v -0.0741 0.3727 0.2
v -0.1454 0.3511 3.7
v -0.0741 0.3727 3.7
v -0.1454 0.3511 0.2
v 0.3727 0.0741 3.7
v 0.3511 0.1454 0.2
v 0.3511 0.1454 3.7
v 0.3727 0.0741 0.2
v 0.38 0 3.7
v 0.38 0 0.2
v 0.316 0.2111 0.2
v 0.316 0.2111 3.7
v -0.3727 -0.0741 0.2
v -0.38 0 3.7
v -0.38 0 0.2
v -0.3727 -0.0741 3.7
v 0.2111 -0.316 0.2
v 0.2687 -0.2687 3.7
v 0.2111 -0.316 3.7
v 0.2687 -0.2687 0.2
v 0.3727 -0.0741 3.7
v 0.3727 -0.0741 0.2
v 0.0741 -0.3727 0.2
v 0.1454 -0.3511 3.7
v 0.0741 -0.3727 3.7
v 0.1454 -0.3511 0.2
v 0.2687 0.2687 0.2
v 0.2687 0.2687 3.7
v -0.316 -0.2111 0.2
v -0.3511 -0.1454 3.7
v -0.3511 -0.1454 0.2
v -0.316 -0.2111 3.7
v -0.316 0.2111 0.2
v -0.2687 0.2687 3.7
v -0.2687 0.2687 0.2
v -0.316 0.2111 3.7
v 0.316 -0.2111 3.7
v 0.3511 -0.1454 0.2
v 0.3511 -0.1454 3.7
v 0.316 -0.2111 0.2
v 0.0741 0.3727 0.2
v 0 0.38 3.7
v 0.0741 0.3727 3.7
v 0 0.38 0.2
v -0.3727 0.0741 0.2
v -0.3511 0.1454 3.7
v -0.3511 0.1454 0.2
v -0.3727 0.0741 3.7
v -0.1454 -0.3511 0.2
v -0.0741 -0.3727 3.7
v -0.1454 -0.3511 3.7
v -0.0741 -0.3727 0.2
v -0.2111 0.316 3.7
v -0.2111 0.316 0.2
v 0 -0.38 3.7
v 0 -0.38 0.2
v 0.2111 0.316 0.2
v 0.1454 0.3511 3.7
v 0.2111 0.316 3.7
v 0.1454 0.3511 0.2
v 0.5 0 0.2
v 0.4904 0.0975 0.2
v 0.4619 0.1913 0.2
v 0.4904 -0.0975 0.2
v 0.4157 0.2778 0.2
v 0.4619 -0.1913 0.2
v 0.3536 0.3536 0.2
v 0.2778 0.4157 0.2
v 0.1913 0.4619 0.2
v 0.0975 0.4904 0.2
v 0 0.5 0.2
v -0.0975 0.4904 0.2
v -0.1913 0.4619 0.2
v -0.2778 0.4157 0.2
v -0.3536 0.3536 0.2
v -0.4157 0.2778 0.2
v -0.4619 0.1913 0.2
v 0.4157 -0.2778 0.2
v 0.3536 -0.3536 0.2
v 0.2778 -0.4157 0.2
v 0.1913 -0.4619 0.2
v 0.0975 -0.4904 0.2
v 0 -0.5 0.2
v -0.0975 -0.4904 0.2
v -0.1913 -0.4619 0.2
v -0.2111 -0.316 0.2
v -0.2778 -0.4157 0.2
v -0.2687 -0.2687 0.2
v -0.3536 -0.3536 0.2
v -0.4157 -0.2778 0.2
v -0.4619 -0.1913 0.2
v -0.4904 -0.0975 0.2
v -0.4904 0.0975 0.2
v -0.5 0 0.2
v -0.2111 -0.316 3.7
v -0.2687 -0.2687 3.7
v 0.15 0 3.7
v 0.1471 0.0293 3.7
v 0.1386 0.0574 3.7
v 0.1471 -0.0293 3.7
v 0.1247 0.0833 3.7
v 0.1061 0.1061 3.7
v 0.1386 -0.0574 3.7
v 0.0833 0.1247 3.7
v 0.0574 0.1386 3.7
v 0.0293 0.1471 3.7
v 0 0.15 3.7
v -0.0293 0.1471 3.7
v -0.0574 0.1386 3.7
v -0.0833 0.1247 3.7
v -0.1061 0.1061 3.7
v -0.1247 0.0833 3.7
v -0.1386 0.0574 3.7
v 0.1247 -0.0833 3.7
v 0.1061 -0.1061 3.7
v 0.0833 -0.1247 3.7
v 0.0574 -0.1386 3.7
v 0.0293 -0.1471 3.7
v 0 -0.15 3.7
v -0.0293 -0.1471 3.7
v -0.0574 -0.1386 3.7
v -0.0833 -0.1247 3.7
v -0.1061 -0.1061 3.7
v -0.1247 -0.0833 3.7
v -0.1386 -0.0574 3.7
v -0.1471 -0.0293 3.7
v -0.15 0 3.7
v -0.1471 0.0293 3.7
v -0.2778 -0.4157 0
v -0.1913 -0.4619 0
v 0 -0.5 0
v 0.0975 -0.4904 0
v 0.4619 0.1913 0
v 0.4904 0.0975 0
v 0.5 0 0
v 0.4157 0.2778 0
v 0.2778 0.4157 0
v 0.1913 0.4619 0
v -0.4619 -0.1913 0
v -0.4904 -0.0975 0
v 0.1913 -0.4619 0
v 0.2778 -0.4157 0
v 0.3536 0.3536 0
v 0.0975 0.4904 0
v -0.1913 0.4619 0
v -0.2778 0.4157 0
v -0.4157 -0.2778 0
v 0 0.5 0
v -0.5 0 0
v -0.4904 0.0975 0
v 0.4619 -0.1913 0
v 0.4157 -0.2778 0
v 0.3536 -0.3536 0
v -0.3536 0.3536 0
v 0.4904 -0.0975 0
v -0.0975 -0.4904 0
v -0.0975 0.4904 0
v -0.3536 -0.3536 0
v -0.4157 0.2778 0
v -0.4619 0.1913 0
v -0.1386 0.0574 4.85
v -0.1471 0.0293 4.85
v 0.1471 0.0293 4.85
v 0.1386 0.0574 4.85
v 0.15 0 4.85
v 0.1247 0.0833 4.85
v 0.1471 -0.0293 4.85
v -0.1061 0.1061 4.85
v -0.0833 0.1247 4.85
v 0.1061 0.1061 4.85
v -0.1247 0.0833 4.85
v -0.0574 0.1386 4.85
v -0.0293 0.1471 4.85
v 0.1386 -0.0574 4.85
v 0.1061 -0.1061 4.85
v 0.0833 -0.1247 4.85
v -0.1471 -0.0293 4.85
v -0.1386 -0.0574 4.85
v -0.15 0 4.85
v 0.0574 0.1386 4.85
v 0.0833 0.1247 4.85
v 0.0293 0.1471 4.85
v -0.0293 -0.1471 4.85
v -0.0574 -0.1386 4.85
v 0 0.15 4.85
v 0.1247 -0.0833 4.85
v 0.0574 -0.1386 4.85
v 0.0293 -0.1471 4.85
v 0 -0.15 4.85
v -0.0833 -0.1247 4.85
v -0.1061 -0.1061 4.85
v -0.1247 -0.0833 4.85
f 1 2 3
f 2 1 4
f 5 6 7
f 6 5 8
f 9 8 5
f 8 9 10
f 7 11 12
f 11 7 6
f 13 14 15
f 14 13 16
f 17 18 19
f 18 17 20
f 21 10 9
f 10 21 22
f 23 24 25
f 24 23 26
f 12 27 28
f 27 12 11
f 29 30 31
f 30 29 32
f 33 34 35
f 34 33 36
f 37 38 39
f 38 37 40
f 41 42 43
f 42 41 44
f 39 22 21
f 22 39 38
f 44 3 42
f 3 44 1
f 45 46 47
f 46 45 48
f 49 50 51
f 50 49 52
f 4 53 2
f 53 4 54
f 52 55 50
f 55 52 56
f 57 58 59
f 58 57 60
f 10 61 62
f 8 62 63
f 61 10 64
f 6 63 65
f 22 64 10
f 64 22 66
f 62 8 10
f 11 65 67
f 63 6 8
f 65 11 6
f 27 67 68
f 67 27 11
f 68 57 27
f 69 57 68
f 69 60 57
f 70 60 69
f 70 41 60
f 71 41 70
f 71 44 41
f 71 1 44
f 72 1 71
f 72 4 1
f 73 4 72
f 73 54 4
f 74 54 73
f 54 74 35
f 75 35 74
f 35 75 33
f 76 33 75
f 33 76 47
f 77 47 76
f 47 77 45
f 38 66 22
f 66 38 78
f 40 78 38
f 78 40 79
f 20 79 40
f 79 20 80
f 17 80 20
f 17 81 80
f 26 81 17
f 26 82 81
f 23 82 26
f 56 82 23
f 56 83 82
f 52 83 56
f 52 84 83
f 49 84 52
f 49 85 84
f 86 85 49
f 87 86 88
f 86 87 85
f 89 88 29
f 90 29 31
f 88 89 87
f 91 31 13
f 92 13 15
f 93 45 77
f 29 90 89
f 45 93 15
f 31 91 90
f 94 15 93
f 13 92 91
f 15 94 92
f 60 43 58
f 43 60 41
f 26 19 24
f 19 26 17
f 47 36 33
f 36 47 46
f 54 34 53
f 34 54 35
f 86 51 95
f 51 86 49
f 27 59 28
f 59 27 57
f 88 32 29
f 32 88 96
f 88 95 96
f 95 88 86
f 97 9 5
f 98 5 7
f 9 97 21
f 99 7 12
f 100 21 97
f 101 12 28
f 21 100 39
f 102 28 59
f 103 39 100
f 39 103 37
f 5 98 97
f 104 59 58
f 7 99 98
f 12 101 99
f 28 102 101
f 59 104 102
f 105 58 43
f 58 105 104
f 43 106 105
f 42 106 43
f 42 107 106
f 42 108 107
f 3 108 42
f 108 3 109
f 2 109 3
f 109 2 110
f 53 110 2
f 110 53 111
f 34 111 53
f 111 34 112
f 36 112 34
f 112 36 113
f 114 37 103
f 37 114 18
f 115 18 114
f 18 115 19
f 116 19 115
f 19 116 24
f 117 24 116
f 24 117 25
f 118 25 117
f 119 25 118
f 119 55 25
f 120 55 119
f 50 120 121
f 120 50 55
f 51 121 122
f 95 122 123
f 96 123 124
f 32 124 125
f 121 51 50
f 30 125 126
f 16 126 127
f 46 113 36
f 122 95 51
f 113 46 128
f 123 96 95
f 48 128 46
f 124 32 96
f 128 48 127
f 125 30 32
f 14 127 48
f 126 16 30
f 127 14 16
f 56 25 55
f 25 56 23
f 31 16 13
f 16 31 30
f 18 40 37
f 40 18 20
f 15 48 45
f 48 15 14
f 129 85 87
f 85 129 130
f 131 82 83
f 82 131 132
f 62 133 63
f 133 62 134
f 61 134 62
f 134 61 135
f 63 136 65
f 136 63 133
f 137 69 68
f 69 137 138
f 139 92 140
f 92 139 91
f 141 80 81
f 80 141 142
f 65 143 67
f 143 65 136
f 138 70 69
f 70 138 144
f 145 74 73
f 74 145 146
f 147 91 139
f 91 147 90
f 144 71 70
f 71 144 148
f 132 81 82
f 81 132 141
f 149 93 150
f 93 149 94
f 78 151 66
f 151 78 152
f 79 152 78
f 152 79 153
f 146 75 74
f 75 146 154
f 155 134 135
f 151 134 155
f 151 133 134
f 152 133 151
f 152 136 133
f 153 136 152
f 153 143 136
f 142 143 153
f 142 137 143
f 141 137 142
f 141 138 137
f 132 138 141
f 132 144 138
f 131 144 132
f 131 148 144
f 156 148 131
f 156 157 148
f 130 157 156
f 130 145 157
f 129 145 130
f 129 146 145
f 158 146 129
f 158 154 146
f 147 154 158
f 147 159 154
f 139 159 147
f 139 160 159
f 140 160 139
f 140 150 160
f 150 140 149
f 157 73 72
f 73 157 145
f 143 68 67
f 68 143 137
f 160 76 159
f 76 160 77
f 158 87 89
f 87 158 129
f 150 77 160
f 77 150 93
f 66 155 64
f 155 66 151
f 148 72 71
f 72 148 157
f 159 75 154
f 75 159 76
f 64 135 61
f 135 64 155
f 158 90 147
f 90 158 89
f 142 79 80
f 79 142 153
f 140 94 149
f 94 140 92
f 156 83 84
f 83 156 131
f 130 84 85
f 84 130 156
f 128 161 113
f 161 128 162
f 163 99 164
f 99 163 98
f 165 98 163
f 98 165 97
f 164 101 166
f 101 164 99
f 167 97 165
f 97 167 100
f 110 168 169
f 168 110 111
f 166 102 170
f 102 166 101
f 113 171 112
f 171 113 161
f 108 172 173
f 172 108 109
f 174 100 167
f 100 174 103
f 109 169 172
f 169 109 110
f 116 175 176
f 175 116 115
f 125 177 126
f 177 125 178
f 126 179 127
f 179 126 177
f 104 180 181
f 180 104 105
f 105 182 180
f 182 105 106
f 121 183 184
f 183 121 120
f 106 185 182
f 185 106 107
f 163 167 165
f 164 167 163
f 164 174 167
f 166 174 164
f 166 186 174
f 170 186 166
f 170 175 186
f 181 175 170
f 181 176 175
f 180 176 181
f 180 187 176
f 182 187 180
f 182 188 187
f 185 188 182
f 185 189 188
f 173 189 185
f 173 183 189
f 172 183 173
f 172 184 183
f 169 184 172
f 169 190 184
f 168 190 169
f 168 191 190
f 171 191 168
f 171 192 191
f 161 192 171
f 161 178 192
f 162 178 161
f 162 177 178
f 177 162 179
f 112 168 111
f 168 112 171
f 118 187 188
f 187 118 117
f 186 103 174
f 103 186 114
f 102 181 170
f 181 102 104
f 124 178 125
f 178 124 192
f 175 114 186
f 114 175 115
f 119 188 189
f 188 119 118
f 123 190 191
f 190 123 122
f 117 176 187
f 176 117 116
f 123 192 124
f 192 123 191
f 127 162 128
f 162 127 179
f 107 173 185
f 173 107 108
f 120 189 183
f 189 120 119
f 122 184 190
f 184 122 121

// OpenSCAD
// Parameters
body_diameter_mm = 0.76; //[0.38:1.52:0.01]
overall_height_mm = 4.7; //[2.35:9.4:0.05]
body_height_mm = 3.5; //[1.75:7:0.05]
lever_height_mm = 1.2; //[0.6:2.4:0.05]
lever_diameter_mm = 0.3; //[0.15:0.6:0.01]
base_flange_diameter_mm = 1; //[0.5:2:0.05]
base_flange_thickness_mm = 0.2; //[0.1:0.4:0.01]
overlap_mm = 0.05; //[0.02:0.2:0.01]

// Toggle switch - complete geometry
module toggle() {
  union() {
    // Cylindrical Body
    color("DimGray") translate([0, 0, base_flange_thickness_mm + body_height_mm / 2])
      cylinder(r=body_diameter_mm / 2, h=body_height_mm, center=true, $fn=32);
    
    // Base Flange
    color("Silver") translate([0, 0, base_flange_thickness_mm / 2])
      cylinder(r=base_flange_diameter_mm / 2, h=base_flange_thickness_mm, center=true, $fn=32);
    
    // Toggle Lever
    color("Black") translate([0, 0, base_flange_thickness_mm + body_height_mm + lever_height_mm / 2 - overlap_mm])
      cylinder(r=lever_diameter_mm / 2, h=lever_height_mm, center=true, $fn=32);
  }
}

// Assembly
module assembly() {
  toggle();
}

assembly();
